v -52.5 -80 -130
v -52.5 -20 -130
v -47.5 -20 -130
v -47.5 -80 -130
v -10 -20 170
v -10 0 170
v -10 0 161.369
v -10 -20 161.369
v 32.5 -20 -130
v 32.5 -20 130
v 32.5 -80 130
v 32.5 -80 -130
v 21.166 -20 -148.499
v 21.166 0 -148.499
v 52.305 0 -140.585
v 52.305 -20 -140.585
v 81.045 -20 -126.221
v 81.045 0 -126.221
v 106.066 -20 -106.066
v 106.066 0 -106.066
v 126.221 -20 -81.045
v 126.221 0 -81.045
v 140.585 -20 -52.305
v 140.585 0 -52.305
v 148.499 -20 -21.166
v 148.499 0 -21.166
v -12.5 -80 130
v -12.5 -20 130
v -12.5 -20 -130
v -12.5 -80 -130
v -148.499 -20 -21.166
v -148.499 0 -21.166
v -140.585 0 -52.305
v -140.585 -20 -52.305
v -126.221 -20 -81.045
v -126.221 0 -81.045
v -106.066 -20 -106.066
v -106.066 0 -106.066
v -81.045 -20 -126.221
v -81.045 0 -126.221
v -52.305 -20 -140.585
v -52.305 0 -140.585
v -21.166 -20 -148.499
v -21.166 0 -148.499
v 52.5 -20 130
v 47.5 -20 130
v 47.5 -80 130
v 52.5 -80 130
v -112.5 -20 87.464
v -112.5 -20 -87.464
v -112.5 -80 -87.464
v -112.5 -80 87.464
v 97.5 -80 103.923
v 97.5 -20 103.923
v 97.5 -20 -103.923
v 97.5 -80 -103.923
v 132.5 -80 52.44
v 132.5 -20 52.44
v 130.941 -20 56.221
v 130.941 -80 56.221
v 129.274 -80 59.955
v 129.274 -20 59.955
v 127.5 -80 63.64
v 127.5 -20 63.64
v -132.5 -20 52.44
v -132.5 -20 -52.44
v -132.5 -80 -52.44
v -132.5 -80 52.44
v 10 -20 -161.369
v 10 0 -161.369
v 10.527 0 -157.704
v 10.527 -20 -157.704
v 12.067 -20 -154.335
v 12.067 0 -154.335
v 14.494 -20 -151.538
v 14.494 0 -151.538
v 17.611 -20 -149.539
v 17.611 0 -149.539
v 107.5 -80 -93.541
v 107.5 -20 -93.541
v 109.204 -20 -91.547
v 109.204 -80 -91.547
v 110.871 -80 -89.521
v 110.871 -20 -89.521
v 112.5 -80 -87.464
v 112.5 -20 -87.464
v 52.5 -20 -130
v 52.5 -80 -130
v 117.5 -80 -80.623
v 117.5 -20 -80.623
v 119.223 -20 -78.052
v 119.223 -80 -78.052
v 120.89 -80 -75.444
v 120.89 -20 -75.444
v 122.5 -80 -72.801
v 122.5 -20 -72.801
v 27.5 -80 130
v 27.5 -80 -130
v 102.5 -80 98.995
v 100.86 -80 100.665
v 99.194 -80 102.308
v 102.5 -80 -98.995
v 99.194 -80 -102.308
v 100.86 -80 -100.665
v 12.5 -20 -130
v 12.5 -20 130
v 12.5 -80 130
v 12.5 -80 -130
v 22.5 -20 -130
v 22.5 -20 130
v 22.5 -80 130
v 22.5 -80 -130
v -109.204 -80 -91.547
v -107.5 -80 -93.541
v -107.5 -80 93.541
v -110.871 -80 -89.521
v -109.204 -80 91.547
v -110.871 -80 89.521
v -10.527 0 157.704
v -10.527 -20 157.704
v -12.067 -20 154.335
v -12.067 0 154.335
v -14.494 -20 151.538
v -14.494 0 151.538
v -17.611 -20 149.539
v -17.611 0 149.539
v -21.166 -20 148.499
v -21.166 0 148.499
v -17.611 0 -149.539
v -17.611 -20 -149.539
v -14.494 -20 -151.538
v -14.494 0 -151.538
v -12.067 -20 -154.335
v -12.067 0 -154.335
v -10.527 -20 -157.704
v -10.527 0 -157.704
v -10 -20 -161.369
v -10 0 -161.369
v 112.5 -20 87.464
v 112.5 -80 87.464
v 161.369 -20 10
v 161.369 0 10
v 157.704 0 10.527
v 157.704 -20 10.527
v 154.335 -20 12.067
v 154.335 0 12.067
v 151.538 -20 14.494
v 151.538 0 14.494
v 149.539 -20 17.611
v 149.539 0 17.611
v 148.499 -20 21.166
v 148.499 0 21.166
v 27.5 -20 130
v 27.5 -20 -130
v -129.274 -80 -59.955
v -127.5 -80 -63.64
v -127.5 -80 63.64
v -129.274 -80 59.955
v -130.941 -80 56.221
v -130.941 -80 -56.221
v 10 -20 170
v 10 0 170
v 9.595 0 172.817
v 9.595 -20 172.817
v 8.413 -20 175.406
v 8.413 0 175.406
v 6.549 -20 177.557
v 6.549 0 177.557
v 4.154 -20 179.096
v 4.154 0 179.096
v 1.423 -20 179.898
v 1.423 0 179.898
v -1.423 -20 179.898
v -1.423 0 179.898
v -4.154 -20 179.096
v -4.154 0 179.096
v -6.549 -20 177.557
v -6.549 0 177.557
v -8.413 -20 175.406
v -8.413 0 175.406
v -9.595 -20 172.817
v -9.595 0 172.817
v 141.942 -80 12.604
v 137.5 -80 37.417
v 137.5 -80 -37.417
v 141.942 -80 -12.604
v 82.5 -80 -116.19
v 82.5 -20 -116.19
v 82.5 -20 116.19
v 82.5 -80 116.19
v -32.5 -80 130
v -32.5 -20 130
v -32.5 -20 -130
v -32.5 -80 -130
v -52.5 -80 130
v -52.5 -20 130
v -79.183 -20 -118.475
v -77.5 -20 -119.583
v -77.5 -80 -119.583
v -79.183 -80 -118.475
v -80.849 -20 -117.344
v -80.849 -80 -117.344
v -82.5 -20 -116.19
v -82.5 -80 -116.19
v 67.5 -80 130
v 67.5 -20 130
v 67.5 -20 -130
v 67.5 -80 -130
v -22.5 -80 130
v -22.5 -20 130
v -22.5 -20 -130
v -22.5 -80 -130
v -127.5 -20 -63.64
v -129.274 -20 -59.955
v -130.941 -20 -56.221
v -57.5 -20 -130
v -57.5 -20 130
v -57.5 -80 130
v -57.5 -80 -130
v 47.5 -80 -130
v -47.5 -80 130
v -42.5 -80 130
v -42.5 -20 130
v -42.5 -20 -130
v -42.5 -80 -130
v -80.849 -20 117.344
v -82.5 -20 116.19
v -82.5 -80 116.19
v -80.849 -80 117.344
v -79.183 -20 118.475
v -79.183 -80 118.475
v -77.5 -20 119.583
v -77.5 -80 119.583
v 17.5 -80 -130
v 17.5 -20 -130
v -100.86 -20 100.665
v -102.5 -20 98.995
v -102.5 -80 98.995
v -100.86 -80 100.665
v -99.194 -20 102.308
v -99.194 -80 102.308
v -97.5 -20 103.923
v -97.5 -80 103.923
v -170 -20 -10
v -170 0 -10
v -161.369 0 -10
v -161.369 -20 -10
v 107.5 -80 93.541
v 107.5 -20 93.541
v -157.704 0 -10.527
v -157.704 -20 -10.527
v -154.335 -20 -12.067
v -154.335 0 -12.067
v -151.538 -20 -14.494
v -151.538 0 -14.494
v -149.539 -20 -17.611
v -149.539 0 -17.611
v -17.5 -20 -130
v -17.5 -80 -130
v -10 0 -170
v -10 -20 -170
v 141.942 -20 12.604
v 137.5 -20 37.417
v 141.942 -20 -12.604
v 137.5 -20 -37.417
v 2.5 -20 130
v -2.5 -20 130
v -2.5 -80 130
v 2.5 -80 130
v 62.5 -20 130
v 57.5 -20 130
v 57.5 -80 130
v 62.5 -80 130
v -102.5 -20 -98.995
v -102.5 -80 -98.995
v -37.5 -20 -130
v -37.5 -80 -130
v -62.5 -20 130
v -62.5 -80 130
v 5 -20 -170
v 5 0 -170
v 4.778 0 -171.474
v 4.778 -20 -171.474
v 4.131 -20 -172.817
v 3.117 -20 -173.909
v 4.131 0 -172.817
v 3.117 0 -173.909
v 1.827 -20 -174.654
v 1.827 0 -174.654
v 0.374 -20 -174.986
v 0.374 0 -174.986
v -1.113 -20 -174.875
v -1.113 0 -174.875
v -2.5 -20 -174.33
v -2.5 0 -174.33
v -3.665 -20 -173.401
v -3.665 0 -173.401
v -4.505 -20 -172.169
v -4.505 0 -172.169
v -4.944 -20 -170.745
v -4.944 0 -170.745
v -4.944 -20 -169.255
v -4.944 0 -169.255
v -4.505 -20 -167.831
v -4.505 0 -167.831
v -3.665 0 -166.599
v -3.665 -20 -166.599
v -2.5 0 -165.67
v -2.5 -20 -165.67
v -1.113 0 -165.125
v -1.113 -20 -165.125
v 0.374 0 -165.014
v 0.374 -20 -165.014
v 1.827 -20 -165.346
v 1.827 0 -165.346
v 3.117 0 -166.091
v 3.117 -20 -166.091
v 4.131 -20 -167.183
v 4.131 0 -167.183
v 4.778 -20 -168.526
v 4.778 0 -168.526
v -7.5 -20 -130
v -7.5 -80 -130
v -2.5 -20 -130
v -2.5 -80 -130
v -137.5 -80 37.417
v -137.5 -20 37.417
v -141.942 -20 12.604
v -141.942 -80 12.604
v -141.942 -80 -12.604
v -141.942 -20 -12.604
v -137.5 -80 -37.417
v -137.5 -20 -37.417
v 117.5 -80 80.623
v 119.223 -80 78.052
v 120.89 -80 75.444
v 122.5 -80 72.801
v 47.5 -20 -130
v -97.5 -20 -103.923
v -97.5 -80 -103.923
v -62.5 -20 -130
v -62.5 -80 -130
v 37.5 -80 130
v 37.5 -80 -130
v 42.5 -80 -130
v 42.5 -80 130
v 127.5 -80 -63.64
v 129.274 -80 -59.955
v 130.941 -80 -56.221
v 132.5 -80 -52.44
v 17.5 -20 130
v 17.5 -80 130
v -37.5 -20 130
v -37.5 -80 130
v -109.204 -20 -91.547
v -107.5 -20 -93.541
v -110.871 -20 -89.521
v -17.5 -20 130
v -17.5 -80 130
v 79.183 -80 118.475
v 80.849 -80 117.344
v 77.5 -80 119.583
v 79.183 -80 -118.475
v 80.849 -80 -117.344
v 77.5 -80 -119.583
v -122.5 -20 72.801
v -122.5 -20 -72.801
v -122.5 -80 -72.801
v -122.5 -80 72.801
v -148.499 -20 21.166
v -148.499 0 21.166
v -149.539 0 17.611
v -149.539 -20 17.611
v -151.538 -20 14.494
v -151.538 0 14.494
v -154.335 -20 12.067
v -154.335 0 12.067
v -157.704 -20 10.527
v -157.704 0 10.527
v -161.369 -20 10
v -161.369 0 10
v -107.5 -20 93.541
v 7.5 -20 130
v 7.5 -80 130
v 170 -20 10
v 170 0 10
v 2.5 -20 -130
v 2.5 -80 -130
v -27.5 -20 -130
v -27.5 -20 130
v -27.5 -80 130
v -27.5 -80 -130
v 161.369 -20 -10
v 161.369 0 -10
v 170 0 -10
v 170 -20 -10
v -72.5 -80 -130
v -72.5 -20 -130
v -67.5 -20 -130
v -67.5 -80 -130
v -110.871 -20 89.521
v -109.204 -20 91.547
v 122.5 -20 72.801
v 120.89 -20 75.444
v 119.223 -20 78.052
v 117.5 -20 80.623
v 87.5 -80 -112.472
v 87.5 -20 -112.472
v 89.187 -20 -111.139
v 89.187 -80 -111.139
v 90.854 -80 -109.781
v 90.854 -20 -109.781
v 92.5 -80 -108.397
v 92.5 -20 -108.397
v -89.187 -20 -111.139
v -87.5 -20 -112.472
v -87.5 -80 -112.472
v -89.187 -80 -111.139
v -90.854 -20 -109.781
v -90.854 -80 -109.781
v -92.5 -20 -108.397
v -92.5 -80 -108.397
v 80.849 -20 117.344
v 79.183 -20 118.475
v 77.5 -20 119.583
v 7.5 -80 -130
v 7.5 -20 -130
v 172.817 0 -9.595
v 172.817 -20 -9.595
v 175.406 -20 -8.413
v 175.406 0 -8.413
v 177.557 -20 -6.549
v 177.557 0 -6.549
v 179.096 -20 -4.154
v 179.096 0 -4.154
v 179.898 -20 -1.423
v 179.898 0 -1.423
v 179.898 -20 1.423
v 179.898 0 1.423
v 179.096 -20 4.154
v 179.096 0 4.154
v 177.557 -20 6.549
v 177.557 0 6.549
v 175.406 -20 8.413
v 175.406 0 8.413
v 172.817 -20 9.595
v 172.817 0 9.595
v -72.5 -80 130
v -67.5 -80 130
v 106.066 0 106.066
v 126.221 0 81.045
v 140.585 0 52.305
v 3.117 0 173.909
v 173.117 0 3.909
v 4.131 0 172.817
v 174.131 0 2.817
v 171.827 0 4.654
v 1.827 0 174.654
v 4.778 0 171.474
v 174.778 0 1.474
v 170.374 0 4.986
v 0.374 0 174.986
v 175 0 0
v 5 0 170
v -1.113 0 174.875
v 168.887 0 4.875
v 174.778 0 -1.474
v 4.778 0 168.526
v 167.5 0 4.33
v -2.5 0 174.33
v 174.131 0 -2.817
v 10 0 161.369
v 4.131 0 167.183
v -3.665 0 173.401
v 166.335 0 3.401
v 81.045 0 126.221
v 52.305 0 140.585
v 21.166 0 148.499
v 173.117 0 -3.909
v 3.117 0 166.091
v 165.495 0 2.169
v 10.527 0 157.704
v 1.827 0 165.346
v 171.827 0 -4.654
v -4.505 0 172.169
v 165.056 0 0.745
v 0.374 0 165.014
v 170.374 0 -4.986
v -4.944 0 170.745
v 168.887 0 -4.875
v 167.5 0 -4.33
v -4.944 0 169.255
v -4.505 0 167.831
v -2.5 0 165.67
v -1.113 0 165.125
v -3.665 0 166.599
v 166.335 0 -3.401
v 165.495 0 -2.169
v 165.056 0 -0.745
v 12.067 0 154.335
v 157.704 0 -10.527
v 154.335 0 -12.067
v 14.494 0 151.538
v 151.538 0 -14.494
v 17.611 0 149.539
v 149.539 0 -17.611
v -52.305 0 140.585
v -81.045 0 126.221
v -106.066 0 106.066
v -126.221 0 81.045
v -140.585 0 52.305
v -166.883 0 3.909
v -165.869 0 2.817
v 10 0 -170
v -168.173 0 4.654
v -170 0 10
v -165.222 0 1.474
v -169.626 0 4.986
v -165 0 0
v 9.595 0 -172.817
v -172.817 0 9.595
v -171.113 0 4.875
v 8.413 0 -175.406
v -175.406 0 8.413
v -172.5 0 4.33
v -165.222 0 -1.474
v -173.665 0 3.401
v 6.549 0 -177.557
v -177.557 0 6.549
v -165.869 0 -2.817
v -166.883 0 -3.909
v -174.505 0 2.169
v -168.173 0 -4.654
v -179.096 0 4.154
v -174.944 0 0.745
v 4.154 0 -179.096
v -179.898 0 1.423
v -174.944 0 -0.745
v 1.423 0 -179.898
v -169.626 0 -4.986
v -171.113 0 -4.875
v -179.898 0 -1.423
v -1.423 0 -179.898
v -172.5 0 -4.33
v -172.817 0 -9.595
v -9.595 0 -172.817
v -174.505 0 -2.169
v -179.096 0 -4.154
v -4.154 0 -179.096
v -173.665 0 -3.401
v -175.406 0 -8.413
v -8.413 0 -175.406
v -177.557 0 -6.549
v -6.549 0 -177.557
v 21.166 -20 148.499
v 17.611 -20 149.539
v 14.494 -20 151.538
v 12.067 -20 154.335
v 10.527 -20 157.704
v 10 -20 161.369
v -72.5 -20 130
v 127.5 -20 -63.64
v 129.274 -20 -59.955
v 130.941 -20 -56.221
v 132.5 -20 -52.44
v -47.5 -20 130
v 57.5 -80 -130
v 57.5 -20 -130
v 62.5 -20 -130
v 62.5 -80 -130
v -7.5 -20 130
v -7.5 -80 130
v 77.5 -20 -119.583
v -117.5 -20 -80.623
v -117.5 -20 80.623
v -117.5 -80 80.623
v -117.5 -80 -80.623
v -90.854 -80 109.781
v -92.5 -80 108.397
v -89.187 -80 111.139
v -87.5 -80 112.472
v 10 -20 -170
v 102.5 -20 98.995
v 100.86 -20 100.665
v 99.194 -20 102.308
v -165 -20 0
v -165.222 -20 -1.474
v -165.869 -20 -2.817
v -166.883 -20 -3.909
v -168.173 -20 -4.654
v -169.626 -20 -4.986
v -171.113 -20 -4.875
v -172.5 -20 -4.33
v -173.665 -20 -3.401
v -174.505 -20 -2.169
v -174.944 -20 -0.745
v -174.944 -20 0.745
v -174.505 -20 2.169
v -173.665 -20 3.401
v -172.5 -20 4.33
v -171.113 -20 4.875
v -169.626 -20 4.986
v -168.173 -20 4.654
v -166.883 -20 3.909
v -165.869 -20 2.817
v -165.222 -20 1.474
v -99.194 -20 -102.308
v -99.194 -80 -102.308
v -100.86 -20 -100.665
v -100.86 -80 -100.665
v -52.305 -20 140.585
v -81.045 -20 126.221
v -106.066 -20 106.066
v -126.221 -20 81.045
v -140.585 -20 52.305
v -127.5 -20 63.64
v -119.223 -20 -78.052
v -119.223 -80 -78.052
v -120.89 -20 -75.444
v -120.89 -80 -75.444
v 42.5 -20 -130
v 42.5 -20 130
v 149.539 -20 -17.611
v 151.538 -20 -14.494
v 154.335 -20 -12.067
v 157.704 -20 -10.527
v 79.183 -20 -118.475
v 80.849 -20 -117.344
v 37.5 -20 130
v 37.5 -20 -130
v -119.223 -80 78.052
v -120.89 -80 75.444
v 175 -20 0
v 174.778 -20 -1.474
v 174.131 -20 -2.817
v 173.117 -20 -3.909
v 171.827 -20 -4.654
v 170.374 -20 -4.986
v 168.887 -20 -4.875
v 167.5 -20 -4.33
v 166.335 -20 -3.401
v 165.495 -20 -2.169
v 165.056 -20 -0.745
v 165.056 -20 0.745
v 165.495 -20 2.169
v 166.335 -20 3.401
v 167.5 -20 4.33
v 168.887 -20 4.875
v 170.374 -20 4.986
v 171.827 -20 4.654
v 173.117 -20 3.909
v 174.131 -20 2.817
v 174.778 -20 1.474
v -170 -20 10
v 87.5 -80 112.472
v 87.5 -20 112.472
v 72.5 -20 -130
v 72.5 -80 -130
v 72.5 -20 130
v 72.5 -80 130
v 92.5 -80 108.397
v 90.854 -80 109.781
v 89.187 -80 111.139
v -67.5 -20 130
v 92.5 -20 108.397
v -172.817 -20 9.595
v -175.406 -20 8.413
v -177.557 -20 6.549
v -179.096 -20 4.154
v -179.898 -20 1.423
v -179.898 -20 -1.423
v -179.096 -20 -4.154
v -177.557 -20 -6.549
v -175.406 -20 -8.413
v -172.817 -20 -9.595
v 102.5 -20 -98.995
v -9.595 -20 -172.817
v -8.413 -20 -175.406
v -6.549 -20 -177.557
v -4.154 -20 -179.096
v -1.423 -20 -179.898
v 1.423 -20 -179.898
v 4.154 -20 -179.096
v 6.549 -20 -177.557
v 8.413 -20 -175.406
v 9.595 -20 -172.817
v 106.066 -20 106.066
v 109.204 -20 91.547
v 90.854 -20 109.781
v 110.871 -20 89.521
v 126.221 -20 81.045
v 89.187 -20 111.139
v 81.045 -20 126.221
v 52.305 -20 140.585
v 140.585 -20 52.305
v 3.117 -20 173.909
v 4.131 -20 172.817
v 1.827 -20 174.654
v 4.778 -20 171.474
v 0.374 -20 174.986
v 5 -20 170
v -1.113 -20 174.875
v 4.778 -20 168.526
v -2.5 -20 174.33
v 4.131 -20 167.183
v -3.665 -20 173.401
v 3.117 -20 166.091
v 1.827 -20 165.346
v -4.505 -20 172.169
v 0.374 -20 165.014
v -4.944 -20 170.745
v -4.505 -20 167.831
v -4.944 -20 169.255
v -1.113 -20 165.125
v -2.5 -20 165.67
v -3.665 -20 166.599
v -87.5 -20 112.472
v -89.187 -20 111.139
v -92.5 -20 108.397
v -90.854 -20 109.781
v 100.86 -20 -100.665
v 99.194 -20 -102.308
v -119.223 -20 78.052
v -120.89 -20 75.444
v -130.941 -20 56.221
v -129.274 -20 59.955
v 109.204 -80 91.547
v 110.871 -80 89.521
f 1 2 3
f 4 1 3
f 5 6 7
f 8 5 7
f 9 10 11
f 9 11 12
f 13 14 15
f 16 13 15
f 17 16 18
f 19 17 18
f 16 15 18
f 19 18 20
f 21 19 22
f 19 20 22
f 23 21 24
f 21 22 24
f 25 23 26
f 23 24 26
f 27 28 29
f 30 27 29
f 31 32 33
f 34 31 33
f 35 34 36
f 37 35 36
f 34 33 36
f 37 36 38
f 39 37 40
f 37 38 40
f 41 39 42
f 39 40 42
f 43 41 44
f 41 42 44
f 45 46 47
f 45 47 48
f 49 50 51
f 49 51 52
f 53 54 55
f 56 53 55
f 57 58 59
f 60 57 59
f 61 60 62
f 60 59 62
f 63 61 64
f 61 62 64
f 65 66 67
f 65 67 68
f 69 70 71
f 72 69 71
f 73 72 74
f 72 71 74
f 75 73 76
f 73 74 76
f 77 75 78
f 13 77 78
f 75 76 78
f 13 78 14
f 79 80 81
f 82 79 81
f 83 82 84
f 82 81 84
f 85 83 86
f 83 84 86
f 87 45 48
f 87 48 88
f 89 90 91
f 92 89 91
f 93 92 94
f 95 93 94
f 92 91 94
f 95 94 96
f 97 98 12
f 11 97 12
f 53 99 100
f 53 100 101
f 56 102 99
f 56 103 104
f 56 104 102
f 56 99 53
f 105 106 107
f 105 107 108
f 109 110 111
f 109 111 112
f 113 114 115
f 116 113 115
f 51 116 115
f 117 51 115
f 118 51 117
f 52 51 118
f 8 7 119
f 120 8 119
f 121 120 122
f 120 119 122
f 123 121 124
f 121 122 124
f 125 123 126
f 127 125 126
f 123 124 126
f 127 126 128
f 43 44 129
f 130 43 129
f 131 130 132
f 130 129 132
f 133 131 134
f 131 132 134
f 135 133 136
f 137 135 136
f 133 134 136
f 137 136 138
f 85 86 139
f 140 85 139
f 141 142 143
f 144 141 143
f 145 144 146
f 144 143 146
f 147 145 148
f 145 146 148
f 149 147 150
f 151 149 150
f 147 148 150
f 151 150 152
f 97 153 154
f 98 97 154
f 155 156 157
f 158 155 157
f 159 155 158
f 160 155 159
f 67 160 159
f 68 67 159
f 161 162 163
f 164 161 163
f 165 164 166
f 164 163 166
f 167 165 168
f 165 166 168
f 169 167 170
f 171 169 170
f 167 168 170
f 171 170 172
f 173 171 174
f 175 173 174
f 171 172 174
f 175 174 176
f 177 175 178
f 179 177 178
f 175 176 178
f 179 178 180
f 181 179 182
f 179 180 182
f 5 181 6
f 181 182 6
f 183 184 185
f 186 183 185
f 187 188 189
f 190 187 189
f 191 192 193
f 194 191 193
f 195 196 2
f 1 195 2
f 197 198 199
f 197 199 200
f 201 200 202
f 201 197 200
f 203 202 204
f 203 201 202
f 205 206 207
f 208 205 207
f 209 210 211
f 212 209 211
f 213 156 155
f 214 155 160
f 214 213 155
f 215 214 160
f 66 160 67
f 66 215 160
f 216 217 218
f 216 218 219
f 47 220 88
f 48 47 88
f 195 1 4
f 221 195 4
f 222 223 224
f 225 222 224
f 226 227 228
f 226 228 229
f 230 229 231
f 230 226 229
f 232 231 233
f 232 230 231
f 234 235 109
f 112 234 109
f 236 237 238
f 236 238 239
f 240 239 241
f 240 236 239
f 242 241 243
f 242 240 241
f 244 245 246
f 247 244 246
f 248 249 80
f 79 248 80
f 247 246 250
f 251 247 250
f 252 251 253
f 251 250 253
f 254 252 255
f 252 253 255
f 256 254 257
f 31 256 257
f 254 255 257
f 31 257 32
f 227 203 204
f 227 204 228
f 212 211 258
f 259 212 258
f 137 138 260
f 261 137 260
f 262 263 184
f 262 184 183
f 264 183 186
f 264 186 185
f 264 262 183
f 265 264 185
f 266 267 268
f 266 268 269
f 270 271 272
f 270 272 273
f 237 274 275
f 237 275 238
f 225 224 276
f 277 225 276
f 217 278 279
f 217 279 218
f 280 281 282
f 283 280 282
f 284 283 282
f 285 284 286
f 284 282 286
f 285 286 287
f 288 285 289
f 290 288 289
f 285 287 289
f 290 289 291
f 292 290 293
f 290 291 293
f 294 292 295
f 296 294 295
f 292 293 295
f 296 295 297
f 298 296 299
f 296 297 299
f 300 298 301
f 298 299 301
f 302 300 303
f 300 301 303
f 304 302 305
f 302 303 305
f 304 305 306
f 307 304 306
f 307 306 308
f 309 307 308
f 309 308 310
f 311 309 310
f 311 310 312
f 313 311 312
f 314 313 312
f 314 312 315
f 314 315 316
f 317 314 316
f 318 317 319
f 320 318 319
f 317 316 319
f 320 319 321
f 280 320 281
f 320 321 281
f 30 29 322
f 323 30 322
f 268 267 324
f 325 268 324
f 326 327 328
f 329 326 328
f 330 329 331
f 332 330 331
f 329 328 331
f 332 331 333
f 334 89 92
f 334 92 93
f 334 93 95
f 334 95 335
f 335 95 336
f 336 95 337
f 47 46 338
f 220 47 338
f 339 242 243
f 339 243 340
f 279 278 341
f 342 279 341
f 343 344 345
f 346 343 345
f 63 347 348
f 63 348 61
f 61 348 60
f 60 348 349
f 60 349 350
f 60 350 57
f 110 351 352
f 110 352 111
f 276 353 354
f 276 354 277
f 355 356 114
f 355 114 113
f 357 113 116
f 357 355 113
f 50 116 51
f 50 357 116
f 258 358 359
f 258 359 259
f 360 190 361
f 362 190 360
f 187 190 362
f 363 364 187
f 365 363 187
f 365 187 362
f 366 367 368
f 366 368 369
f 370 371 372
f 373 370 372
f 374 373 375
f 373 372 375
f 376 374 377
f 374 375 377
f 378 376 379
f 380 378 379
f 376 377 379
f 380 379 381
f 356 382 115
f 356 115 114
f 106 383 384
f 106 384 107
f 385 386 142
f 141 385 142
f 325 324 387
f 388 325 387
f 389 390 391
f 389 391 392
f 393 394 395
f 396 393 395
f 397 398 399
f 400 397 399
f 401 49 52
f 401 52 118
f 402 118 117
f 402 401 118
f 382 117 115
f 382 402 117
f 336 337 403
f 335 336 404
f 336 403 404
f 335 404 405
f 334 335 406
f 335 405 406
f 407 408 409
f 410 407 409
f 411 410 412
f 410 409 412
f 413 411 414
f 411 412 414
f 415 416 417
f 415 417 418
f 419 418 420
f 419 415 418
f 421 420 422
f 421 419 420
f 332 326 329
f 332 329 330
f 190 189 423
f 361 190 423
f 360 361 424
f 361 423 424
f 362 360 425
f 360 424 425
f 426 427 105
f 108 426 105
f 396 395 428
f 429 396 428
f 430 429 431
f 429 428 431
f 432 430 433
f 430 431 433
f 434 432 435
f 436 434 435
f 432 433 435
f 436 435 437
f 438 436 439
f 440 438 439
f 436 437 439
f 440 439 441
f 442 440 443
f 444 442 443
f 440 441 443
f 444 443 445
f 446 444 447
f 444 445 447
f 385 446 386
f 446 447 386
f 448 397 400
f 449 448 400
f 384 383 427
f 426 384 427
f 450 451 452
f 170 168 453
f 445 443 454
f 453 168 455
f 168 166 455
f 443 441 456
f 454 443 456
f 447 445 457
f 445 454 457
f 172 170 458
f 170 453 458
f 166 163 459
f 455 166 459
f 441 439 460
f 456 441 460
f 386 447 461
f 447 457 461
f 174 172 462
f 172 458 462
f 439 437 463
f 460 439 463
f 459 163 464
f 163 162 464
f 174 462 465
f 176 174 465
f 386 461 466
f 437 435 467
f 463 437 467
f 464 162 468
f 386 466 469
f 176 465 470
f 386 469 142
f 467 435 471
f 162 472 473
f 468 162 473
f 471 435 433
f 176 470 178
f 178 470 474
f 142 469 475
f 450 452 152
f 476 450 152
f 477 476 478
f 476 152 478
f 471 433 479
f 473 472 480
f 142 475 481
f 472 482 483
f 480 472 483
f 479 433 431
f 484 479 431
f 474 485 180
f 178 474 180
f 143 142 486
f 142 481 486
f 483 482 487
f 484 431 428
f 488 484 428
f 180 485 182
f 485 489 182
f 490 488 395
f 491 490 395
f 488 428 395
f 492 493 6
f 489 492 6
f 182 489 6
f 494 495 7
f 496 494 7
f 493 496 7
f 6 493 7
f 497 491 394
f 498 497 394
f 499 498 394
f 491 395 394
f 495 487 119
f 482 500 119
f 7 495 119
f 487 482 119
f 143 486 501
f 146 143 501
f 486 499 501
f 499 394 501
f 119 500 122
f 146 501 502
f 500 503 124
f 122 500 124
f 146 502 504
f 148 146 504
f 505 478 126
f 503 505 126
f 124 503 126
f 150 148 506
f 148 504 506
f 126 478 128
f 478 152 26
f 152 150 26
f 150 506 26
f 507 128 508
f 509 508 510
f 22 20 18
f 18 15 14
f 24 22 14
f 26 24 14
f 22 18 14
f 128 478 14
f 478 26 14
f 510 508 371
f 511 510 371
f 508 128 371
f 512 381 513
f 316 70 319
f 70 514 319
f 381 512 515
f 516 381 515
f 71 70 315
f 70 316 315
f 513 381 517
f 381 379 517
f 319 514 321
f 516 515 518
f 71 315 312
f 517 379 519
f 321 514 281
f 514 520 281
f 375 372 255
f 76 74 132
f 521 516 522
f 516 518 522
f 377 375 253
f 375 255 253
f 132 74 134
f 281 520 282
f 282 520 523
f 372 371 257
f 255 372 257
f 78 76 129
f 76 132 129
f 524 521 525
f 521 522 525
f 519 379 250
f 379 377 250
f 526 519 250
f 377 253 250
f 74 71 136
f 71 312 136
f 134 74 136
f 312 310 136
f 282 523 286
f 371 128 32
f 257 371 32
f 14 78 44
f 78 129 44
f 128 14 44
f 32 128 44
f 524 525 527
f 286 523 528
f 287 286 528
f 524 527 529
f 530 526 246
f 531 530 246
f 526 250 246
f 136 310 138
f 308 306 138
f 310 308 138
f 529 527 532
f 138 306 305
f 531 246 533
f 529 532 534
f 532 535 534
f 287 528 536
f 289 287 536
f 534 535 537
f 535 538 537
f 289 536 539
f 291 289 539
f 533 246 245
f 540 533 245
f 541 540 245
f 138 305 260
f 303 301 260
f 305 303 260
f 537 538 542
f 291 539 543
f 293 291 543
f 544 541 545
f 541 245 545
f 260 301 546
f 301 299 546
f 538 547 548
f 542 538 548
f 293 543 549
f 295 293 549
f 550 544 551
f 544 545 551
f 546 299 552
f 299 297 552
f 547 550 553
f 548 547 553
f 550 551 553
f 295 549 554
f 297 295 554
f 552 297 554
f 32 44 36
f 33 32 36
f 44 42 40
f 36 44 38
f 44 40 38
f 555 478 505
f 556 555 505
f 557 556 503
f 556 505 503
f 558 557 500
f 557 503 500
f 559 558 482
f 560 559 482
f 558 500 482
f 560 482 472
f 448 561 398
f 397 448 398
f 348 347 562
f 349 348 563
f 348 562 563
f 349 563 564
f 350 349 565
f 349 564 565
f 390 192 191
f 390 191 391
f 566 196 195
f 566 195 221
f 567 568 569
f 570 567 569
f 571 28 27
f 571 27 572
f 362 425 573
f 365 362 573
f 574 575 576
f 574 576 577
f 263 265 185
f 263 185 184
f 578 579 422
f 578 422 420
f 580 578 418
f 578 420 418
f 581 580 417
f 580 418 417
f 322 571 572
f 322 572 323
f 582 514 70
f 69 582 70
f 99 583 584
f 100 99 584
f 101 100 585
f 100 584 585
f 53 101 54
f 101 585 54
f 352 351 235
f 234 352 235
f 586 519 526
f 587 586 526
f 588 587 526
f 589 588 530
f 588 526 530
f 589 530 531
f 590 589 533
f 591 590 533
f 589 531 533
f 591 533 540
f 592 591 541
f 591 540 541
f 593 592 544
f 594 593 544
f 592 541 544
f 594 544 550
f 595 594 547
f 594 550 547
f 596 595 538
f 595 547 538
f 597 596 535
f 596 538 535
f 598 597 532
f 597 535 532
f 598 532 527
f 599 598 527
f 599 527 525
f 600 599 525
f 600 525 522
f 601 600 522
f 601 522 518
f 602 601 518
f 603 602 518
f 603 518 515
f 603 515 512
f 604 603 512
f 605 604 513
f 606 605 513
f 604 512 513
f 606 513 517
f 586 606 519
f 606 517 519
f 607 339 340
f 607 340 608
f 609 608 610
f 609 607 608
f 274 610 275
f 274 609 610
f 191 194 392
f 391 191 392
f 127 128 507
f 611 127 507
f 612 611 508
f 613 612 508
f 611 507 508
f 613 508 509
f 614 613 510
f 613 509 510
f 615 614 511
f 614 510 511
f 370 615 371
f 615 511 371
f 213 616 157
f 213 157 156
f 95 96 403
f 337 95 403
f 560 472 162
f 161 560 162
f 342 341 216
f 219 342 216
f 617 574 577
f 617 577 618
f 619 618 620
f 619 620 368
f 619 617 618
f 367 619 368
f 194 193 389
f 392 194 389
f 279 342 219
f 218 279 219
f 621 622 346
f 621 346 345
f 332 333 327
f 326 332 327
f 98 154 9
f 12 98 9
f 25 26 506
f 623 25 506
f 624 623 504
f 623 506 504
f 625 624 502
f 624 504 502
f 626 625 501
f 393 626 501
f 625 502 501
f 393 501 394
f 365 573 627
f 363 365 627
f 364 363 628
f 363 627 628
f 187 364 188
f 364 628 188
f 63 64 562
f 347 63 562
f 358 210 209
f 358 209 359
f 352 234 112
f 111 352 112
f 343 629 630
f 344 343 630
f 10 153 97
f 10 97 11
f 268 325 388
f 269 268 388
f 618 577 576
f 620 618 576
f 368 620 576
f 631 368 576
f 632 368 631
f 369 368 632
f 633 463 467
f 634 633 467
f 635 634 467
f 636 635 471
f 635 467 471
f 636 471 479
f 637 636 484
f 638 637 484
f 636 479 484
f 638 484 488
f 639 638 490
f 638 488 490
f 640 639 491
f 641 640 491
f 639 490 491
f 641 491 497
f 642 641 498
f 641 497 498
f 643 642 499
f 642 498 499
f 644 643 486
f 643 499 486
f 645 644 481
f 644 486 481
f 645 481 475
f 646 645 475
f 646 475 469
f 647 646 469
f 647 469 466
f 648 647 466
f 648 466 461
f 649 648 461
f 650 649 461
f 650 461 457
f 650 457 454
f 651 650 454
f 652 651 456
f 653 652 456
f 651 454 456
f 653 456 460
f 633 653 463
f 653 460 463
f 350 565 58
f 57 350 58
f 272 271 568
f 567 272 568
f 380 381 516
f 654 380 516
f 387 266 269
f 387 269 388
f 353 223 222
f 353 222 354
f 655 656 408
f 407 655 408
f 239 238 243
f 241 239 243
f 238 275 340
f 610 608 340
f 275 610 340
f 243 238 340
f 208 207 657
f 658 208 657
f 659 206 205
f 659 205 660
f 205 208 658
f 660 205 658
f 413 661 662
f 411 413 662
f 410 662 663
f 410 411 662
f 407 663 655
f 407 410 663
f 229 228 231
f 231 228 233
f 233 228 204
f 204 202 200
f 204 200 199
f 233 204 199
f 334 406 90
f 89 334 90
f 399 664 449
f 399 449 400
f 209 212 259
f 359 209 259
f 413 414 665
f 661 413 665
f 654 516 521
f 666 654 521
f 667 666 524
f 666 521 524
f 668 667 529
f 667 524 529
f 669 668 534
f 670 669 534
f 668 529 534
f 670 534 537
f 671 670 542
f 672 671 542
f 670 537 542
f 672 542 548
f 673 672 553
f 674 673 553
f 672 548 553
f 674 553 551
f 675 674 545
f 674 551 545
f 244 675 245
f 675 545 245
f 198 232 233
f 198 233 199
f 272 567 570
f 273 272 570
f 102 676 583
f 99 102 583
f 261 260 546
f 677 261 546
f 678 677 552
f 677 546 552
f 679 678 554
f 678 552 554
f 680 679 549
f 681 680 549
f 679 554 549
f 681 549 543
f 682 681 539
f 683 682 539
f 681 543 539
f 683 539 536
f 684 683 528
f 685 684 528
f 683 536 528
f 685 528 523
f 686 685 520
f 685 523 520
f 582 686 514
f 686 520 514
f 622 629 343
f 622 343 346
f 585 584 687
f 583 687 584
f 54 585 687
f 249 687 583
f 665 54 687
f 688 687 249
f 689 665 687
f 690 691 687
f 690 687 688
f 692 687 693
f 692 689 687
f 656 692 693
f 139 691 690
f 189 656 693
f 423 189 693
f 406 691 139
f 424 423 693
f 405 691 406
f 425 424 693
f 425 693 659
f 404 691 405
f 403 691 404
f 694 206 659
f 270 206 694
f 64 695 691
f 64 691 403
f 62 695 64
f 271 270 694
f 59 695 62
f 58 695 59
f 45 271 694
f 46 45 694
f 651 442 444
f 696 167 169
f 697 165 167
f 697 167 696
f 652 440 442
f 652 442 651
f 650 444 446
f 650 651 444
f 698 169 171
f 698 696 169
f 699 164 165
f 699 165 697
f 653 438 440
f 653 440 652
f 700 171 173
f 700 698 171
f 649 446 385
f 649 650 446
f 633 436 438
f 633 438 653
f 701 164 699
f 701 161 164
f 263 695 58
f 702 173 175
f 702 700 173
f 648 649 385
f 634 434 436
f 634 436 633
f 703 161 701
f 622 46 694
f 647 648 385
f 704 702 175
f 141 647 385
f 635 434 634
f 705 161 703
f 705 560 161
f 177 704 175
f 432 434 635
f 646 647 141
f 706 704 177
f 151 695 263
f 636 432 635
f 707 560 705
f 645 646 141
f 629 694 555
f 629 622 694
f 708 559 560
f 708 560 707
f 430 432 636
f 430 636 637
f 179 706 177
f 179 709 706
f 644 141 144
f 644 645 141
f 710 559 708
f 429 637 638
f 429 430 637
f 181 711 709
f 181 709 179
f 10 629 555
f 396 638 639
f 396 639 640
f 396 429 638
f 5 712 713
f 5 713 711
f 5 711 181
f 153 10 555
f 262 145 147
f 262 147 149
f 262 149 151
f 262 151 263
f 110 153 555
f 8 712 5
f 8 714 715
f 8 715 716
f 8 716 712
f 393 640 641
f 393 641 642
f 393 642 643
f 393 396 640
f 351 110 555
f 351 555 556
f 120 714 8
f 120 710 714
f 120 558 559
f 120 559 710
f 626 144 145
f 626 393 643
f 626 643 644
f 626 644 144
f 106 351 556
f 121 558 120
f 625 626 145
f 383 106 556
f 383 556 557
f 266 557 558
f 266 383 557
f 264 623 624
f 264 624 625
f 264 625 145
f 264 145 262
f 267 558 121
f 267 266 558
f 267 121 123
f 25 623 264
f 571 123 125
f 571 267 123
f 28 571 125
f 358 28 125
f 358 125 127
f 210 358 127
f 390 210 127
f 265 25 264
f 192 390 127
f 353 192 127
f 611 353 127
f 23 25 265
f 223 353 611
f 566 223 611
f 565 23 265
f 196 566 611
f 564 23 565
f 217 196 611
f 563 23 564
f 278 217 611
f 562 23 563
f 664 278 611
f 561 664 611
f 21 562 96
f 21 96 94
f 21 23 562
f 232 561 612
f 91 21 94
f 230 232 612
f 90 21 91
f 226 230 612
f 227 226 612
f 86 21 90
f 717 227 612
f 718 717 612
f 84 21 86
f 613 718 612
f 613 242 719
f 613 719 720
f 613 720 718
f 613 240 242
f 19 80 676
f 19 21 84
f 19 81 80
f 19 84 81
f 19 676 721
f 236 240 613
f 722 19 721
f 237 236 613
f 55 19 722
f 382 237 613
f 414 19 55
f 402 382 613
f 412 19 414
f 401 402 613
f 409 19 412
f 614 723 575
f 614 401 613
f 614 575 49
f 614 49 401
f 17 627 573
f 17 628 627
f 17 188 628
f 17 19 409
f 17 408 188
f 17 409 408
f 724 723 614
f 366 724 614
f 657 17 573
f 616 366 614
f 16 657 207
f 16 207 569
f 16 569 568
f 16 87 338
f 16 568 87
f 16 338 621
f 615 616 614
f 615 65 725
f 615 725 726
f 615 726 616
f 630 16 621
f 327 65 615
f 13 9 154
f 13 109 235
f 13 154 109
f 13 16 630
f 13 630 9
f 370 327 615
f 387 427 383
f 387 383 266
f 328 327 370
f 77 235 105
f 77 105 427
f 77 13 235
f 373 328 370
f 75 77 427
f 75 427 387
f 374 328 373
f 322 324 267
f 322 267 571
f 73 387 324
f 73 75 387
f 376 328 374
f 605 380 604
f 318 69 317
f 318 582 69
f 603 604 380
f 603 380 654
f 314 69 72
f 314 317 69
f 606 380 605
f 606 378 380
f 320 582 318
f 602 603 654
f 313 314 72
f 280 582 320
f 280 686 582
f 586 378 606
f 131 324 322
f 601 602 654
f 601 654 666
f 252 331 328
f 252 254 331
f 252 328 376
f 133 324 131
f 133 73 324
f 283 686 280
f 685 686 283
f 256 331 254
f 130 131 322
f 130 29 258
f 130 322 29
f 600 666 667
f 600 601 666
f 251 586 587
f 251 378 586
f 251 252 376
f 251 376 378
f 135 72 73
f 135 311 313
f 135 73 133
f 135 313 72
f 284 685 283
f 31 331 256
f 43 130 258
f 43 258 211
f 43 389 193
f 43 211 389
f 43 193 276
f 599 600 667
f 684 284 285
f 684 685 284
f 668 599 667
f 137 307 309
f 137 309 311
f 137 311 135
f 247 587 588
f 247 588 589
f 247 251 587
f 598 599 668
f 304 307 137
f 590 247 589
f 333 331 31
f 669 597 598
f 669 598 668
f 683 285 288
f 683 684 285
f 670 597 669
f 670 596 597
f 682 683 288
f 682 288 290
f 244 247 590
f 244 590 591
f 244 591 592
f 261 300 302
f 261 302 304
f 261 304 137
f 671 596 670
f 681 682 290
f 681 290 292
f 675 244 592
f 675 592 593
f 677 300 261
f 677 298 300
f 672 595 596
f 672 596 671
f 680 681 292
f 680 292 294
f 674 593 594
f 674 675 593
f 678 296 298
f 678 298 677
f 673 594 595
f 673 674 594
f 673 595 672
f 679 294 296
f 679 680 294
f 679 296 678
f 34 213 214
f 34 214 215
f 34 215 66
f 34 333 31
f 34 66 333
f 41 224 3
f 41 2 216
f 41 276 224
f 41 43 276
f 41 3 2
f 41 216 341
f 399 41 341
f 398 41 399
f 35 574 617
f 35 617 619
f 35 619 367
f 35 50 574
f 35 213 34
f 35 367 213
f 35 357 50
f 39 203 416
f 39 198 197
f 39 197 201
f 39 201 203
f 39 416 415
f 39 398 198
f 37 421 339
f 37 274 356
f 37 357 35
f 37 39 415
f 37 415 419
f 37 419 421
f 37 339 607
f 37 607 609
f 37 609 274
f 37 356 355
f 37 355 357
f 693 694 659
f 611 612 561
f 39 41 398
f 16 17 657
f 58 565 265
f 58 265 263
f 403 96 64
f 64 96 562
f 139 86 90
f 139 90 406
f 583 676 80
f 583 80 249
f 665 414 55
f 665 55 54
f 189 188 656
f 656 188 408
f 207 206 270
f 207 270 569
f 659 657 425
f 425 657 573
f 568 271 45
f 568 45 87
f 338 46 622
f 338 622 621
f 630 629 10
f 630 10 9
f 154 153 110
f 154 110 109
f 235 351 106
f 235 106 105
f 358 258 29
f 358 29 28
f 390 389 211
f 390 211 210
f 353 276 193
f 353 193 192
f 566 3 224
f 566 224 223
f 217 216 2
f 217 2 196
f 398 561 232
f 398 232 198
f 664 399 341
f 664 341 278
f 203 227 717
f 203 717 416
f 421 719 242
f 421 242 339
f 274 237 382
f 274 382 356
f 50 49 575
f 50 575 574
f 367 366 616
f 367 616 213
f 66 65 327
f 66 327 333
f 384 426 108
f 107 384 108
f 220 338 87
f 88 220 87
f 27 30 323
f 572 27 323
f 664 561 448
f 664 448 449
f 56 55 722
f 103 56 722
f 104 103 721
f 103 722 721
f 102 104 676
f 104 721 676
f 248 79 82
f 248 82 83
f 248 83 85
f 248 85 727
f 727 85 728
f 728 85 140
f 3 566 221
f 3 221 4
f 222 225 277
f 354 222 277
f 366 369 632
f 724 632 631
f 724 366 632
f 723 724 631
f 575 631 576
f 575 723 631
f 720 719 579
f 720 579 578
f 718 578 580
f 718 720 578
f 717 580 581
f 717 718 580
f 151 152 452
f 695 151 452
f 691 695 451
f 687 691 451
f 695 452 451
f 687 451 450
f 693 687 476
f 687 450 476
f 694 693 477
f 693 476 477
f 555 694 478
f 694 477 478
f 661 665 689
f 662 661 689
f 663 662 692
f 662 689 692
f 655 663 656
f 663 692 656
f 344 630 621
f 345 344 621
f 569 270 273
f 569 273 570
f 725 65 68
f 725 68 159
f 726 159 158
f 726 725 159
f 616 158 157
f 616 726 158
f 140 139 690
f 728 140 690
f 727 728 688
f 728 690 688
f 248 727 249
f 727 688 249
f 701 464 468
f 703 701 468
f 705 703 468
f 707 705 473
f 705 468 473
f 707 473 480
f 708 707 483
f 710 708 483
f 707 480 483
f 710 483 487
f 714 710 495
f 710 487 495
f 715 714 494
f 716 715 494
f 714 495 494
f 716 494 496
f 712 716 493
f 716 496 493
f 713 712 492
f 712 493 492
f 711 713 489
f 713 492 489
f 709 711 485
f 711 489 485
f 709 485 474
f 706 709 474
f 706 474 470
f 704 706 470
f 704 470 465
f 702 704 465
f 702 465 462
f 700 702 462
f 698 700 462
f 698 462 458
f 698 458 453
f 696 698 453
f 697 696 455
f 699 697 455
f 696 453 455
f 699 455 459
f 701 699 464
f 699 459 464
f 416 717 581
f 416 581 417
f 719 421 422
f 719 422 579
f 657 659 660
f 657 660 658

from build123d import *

# Parameters (mm, degrees)
SKETCH3_R           = 5
BOSS_EXTRUDE4_DEPTH = 20
SKETCH4_W           = 5
SKETCH4_H           = 260
BOSS_EXTRUDE5_DEPTH = 60


with BuildPart() as part:
    # Sketch3 → Boss-Extrude4 (new body)
    with BuildSketch(Plane(origin=(0, 0, 0), x_dir=(1, 0, 0), z_dir=(0, 1, 0))):
        with BuildLine():
            Line((161.369142032, 10), (170, 10))
            ThreePointArc((170, 10), (180, 0), (170, -10))
            Line((170, -10), (161.369142032, -10))
            ThreePointArc((161.369142032, -10), (152.849946816, -13.180462695), (148.499210458, -21.165644172))
            ThreePointArc((148.499210458, -21.165644172), (106.066017178, -106.066017178), (21.165644172, -148.499210458))
            ThreePointArc((21.165644172, -148.499210458), (13.180462695, -152.849946816), (10, -161.369142032))
            Line((10, -161.369142032), (10, -170))
            ThreePointArc((10, -170), (0, -180), (-10, -170))
            Line((-10, -170), (-10, -161.369142032))
            ThreePointArc((-10, -161.369142032), (-13.180462695, -152.849946816), (-21.165644172, -148.499210458))
            ThreePointArc((-21.165644172, -148.499210458), (-106.066017178, -106.066017178), (-148.499210458, -21.165644172))
            ThreePointArc((-148.499210458, -21.165644172), (-152.849946816, -13.180462695), (-161.369142032, -10))
            Line((-161.369142032, -10), (-170, -10))
            ThreePointArc((-170, -10), (-180, 0), (-170, 10))
            Line((-170, 10), (-161.369142032, 10))
            ThreePointArc((-161.369142032, 10), (-152.849946816, 13.180462695), (-148.499210458, 21.165644172))
            ThreePointArc((-148.499210458, 21.165644172), (-106.066017178, 106.066017178), (-21.165644172, 148.499210458))
            ThreePointArc((-21.165644172, 148.499210458), (-13.180462695, 152.849946816), (-10, 161.369142032))
            Line((-10, 161.369142032), (-10, 170))
            ThreePointArc((-10, 170), (0, 180), (10, 170))
            Line((10, 170), (10, 161.369142032))
            ThreePointArc((10, 161.369142032), (13.180462695, 152.849946816), (21.165644172, 148.499210458))
            ThreePointArc((21.165644172, 148.499210458), (106.066017178, 106.066017178), (148.499210458, 21.165644172))
            ThreePointArc((148.499210458, 21.165644172), (152.849946816, 13.180462695), (161.369142032, 10))
        make_face()
        with Locations((0, 170)):
            Circle(SKETCH3_R, mode=Mode.SUBTRACT)
        with Locations((170, 0)):
            Circle(SKETCH3_R, mode=Mode.SUBTRACT)
        with Locations((0, -170)):
            Circle(SKETCH3_R, mode=Mode.SUBTRACT)
        with Locations((-170, 0)):
            Circle(SKETCH3_R, mode=Mode.SUBTRACT)
    extrude(amount=-BOSS_EXTRUDE4_DEPTH)

    # Sketch4 → Boss-Extrude5 (add)
    with BuildSketch(Plane(origin=(0, -20, 0), x_dir=(1, 0, 0), z_dir=(0, 1, 0))):
        Rectangle(SKETCH4_W, SKETCH4_H)
        with Locations((10, 0)):
            Rectangle(SKETCH4_W, SKETCH4_H)
        with Locations((20, 0)):
            Rectangle(SKETCH4_W, SKETCH4_H)
        with Locations((30, 0)):
            Rectangle(SKETCH4_W, SKETCH4_H)
        with Locations((40, 0)):
            Rectangle(SKETCH4_W, SKETCH4_H)
        with Locations((50, 0)):
            Rectangle(SKETCH4_W, SKETCH4_H)
        with Locations((60, 0)):
            Rectangle(SKETCH4_W, SKETCH4_H)
        with Locations((70, 0)):
            Rectangle(SKETCH4_W, SKETCH4_H)
        with BuildLine():
            Line((82.5, 116.189500386), (82.5, -116.189500386))
            ThreePointArc((82.5, -116.189500386), (80.017987314, -117.912559578), (77.5, -119.582607431))
            Line((77.5, -119.582607431), (77.5, 119.582607431))
            ThreePointArc((77.5, 119.582607431), (80.017987314, 117.912559578), (82.5, 116.189500386))
        make_face()
        with BuildLine():
            Line((92.5, 108.397416943), (92.5, -108.397416943))
            ThreePointArc((92.5, -108.397416943), (90.023058171, -110.463111478), (87.5, -112.472218792))
            Line((87.5, -112.472218792), (87.5, 112.472218792))
            ThreePointArc((87.5, 112.472218792), (90.023058171, 110.463111478), (92.5, 108.397416943))
        make_face()
        with BuildLine():
            Line((102.5, 98.994949366), (102.5, -98.994949366))
            ThreePointArc((102.5, -98.994949366), (100.030353094, -101.489794856), (97.5, -103.923048454))
            Line((97.5, -103.923048454), (97.5, 103.923048454))
            ThreePointArc((97.5, 103.923048454), (100.030353094, 101.489794856), (102.5, 98.994949366))
        make_face()
        with BuildLine():
            Line((112.5, 87.464278423), (112.5, -87.464278423))
            ThreePointArc((112.5, -87.464278423), (110.041959984, -90.537379258), (107.5, -93.541434669))
            Line((107.5, -93.541434669), (107.5, 93.541434669))
            ThreePointArc((107.5, 93.541434669), (110.041959984, 90.537379258), (112.5, 87.464278423))
        make_face()
        with Locations((-10, 0)):
            Rectangle(SKETCH4_W, SKETCH4_H)
        with Locations((-20, 0)):
            Rectangle(SKETCH4_W, SKETCH4_H)
        with Locations((-30, 0)):
            Rectangle(SKETCH4_W, SKETCH4_H)
        with Locations((-40, 0)):
            Rectangle(SKETCH4_W, SKETCH4_H)
        with Locations((-50, 0)):
            Rectangle(SKETCH4_W, SKETCH4_H)
        with Locations((-60, 0)):
            Rectangle(SKETCH4_W, SKETCH4_H)
        with Locations((-70, 0)):
            Rectangle(SKETCH4_W, SKETCH4_H)
        with BuildLine():
            Line((-82.5, 116.189500386), (-82.5, -116.189500386))
            ThreePointArc((-82.5, -116.189500386), (-80.017987314, -117.912559578), (-77.5, -119.582607431))
            Line((-77.5, -119.582607431), (-77.5, 119.582607431))
            ThreePointArc((-77.5, 119.582607431), (-80.017987314, 117.912559578), (-82.5, 116.189500386))
        make_face()
        with BuildLine():
            Line((-92.5, 108.397416943), (-92.5, -108.397416943))
            ThreePointArc((-92.5, -108.397416943), (-90.023058171, -110.463111478), (-87.5, -112.472218792))
            Line((-87.5, -112.472218792), (-87.5, 112.472218792))
            ThreePointArc((-87.5, 112.472218792), (-90.023058171, 110.463111478), (-92.5, 108.397416943))
        make_face()
        with BuildLine():
            Line((-102.5, 98.994949366), (-102.5, -98.994949366))
            ThreePointArc((-102.5, -98.994949366), (-100.030353094, -101.489794856), (-97.5, -103.923048454))
            Line((-97.5, -103.923048454), (-97.5, 103.923048454))
            ThreePointArc((-97.5, 103.923048454), (-100.030353094, 101.489794856), (-102.5, 98.994949366))
        make_face()
        with BuildLine():
            Line((-112.5, 87.464278423), (-112.5, -87.464278423))
            ThreePointArc((-112.5, -87.464278423), (-110.041959984, -90.537379258), (-107.5, -93.541434669))
            Line((-107.5, -93.541434669), (-107.5, 93.541434669))
            ThreePointArc((-107.5, 93.541434669), (-110.041959984, 90.537379258), (-112.5, 87.464278423))
        make_face()
        with BuildLine():
            Line((-122.5, 72.801098893), (-122.5, -72.801098893))
            ThreePointArc((-122.5, -72.801098893), (-120.063707597, -76.752564245), (-117.5, -80.622577483))
            Line((-117.5, -80.622577483), (-117.5, 80.622577483))
            ThreePointArc((-117.5, 80.622577483), (-120.063707597, 76.752564245), (-122.5, 72.801098893))
        make_face()
        with BuildLine():
            Line((-132.5, 52.440442409), (-132.5, -52.440442409))
            ThreePointArc((-132.5, -52.440442409), (-130.120541577, -58.09384356), (-127.5, -63.639610307))
            Line((-127.5, -63.639610307), (-127.5, 63.639610307))
            ThreePointArc((-127.5, 63.639610307), (-130.120541577, 58.09384356), (-132.5, 52.440442409))
        make_face()
        with BuildLine():
            Line((-137.5, 37.416573868), (-137.5, -37.416573868))
            ThreePointArc((-137.5, -37.416573868), (-142.5, 0), (-137.5, 37.416573868))
        make_face()
        with BuildLine():
            Line((122.5, 72.801098893), (122.5, -72.801098893))
            ThreePointArc((122.5, -72.801098893), (120.063707597, -76.752564245), (117.5, -80.622577483))
            Line((117.5, -80.622577483), (117.5, 80.622577483))
            ThreePointArc((117.5, 80.622577483), (120.063707597, 76.752564245), (122.5, 72.801098893))
        make_face()
        with BuildLine():
            Line((132.5, 52.440442409), (132.5, -52.440442409))
            ThreePointArc((132.5, -52.440442409), (130.120541577, -58.09384356), (127.5, -63.639610307))
            Line((127.5, -63.639610307), (127.5, 63.639610307))
            ThreePointArc((127.5, 63.639610307), (130.120541577, 58.09384356), (132.5, 52.440442409))
        make_face()
        with BuildLine():
            Line((137.5, 37.416573868), (137.5, -37.416573868))
            ThreePointArc((137.5, -37.416573868), (142.5, 0), (137.5, 37.416573868))
        make_face()
    extrude(amount=-BOSS_EXTRUDE5_DEPTH)


solid = part.part
